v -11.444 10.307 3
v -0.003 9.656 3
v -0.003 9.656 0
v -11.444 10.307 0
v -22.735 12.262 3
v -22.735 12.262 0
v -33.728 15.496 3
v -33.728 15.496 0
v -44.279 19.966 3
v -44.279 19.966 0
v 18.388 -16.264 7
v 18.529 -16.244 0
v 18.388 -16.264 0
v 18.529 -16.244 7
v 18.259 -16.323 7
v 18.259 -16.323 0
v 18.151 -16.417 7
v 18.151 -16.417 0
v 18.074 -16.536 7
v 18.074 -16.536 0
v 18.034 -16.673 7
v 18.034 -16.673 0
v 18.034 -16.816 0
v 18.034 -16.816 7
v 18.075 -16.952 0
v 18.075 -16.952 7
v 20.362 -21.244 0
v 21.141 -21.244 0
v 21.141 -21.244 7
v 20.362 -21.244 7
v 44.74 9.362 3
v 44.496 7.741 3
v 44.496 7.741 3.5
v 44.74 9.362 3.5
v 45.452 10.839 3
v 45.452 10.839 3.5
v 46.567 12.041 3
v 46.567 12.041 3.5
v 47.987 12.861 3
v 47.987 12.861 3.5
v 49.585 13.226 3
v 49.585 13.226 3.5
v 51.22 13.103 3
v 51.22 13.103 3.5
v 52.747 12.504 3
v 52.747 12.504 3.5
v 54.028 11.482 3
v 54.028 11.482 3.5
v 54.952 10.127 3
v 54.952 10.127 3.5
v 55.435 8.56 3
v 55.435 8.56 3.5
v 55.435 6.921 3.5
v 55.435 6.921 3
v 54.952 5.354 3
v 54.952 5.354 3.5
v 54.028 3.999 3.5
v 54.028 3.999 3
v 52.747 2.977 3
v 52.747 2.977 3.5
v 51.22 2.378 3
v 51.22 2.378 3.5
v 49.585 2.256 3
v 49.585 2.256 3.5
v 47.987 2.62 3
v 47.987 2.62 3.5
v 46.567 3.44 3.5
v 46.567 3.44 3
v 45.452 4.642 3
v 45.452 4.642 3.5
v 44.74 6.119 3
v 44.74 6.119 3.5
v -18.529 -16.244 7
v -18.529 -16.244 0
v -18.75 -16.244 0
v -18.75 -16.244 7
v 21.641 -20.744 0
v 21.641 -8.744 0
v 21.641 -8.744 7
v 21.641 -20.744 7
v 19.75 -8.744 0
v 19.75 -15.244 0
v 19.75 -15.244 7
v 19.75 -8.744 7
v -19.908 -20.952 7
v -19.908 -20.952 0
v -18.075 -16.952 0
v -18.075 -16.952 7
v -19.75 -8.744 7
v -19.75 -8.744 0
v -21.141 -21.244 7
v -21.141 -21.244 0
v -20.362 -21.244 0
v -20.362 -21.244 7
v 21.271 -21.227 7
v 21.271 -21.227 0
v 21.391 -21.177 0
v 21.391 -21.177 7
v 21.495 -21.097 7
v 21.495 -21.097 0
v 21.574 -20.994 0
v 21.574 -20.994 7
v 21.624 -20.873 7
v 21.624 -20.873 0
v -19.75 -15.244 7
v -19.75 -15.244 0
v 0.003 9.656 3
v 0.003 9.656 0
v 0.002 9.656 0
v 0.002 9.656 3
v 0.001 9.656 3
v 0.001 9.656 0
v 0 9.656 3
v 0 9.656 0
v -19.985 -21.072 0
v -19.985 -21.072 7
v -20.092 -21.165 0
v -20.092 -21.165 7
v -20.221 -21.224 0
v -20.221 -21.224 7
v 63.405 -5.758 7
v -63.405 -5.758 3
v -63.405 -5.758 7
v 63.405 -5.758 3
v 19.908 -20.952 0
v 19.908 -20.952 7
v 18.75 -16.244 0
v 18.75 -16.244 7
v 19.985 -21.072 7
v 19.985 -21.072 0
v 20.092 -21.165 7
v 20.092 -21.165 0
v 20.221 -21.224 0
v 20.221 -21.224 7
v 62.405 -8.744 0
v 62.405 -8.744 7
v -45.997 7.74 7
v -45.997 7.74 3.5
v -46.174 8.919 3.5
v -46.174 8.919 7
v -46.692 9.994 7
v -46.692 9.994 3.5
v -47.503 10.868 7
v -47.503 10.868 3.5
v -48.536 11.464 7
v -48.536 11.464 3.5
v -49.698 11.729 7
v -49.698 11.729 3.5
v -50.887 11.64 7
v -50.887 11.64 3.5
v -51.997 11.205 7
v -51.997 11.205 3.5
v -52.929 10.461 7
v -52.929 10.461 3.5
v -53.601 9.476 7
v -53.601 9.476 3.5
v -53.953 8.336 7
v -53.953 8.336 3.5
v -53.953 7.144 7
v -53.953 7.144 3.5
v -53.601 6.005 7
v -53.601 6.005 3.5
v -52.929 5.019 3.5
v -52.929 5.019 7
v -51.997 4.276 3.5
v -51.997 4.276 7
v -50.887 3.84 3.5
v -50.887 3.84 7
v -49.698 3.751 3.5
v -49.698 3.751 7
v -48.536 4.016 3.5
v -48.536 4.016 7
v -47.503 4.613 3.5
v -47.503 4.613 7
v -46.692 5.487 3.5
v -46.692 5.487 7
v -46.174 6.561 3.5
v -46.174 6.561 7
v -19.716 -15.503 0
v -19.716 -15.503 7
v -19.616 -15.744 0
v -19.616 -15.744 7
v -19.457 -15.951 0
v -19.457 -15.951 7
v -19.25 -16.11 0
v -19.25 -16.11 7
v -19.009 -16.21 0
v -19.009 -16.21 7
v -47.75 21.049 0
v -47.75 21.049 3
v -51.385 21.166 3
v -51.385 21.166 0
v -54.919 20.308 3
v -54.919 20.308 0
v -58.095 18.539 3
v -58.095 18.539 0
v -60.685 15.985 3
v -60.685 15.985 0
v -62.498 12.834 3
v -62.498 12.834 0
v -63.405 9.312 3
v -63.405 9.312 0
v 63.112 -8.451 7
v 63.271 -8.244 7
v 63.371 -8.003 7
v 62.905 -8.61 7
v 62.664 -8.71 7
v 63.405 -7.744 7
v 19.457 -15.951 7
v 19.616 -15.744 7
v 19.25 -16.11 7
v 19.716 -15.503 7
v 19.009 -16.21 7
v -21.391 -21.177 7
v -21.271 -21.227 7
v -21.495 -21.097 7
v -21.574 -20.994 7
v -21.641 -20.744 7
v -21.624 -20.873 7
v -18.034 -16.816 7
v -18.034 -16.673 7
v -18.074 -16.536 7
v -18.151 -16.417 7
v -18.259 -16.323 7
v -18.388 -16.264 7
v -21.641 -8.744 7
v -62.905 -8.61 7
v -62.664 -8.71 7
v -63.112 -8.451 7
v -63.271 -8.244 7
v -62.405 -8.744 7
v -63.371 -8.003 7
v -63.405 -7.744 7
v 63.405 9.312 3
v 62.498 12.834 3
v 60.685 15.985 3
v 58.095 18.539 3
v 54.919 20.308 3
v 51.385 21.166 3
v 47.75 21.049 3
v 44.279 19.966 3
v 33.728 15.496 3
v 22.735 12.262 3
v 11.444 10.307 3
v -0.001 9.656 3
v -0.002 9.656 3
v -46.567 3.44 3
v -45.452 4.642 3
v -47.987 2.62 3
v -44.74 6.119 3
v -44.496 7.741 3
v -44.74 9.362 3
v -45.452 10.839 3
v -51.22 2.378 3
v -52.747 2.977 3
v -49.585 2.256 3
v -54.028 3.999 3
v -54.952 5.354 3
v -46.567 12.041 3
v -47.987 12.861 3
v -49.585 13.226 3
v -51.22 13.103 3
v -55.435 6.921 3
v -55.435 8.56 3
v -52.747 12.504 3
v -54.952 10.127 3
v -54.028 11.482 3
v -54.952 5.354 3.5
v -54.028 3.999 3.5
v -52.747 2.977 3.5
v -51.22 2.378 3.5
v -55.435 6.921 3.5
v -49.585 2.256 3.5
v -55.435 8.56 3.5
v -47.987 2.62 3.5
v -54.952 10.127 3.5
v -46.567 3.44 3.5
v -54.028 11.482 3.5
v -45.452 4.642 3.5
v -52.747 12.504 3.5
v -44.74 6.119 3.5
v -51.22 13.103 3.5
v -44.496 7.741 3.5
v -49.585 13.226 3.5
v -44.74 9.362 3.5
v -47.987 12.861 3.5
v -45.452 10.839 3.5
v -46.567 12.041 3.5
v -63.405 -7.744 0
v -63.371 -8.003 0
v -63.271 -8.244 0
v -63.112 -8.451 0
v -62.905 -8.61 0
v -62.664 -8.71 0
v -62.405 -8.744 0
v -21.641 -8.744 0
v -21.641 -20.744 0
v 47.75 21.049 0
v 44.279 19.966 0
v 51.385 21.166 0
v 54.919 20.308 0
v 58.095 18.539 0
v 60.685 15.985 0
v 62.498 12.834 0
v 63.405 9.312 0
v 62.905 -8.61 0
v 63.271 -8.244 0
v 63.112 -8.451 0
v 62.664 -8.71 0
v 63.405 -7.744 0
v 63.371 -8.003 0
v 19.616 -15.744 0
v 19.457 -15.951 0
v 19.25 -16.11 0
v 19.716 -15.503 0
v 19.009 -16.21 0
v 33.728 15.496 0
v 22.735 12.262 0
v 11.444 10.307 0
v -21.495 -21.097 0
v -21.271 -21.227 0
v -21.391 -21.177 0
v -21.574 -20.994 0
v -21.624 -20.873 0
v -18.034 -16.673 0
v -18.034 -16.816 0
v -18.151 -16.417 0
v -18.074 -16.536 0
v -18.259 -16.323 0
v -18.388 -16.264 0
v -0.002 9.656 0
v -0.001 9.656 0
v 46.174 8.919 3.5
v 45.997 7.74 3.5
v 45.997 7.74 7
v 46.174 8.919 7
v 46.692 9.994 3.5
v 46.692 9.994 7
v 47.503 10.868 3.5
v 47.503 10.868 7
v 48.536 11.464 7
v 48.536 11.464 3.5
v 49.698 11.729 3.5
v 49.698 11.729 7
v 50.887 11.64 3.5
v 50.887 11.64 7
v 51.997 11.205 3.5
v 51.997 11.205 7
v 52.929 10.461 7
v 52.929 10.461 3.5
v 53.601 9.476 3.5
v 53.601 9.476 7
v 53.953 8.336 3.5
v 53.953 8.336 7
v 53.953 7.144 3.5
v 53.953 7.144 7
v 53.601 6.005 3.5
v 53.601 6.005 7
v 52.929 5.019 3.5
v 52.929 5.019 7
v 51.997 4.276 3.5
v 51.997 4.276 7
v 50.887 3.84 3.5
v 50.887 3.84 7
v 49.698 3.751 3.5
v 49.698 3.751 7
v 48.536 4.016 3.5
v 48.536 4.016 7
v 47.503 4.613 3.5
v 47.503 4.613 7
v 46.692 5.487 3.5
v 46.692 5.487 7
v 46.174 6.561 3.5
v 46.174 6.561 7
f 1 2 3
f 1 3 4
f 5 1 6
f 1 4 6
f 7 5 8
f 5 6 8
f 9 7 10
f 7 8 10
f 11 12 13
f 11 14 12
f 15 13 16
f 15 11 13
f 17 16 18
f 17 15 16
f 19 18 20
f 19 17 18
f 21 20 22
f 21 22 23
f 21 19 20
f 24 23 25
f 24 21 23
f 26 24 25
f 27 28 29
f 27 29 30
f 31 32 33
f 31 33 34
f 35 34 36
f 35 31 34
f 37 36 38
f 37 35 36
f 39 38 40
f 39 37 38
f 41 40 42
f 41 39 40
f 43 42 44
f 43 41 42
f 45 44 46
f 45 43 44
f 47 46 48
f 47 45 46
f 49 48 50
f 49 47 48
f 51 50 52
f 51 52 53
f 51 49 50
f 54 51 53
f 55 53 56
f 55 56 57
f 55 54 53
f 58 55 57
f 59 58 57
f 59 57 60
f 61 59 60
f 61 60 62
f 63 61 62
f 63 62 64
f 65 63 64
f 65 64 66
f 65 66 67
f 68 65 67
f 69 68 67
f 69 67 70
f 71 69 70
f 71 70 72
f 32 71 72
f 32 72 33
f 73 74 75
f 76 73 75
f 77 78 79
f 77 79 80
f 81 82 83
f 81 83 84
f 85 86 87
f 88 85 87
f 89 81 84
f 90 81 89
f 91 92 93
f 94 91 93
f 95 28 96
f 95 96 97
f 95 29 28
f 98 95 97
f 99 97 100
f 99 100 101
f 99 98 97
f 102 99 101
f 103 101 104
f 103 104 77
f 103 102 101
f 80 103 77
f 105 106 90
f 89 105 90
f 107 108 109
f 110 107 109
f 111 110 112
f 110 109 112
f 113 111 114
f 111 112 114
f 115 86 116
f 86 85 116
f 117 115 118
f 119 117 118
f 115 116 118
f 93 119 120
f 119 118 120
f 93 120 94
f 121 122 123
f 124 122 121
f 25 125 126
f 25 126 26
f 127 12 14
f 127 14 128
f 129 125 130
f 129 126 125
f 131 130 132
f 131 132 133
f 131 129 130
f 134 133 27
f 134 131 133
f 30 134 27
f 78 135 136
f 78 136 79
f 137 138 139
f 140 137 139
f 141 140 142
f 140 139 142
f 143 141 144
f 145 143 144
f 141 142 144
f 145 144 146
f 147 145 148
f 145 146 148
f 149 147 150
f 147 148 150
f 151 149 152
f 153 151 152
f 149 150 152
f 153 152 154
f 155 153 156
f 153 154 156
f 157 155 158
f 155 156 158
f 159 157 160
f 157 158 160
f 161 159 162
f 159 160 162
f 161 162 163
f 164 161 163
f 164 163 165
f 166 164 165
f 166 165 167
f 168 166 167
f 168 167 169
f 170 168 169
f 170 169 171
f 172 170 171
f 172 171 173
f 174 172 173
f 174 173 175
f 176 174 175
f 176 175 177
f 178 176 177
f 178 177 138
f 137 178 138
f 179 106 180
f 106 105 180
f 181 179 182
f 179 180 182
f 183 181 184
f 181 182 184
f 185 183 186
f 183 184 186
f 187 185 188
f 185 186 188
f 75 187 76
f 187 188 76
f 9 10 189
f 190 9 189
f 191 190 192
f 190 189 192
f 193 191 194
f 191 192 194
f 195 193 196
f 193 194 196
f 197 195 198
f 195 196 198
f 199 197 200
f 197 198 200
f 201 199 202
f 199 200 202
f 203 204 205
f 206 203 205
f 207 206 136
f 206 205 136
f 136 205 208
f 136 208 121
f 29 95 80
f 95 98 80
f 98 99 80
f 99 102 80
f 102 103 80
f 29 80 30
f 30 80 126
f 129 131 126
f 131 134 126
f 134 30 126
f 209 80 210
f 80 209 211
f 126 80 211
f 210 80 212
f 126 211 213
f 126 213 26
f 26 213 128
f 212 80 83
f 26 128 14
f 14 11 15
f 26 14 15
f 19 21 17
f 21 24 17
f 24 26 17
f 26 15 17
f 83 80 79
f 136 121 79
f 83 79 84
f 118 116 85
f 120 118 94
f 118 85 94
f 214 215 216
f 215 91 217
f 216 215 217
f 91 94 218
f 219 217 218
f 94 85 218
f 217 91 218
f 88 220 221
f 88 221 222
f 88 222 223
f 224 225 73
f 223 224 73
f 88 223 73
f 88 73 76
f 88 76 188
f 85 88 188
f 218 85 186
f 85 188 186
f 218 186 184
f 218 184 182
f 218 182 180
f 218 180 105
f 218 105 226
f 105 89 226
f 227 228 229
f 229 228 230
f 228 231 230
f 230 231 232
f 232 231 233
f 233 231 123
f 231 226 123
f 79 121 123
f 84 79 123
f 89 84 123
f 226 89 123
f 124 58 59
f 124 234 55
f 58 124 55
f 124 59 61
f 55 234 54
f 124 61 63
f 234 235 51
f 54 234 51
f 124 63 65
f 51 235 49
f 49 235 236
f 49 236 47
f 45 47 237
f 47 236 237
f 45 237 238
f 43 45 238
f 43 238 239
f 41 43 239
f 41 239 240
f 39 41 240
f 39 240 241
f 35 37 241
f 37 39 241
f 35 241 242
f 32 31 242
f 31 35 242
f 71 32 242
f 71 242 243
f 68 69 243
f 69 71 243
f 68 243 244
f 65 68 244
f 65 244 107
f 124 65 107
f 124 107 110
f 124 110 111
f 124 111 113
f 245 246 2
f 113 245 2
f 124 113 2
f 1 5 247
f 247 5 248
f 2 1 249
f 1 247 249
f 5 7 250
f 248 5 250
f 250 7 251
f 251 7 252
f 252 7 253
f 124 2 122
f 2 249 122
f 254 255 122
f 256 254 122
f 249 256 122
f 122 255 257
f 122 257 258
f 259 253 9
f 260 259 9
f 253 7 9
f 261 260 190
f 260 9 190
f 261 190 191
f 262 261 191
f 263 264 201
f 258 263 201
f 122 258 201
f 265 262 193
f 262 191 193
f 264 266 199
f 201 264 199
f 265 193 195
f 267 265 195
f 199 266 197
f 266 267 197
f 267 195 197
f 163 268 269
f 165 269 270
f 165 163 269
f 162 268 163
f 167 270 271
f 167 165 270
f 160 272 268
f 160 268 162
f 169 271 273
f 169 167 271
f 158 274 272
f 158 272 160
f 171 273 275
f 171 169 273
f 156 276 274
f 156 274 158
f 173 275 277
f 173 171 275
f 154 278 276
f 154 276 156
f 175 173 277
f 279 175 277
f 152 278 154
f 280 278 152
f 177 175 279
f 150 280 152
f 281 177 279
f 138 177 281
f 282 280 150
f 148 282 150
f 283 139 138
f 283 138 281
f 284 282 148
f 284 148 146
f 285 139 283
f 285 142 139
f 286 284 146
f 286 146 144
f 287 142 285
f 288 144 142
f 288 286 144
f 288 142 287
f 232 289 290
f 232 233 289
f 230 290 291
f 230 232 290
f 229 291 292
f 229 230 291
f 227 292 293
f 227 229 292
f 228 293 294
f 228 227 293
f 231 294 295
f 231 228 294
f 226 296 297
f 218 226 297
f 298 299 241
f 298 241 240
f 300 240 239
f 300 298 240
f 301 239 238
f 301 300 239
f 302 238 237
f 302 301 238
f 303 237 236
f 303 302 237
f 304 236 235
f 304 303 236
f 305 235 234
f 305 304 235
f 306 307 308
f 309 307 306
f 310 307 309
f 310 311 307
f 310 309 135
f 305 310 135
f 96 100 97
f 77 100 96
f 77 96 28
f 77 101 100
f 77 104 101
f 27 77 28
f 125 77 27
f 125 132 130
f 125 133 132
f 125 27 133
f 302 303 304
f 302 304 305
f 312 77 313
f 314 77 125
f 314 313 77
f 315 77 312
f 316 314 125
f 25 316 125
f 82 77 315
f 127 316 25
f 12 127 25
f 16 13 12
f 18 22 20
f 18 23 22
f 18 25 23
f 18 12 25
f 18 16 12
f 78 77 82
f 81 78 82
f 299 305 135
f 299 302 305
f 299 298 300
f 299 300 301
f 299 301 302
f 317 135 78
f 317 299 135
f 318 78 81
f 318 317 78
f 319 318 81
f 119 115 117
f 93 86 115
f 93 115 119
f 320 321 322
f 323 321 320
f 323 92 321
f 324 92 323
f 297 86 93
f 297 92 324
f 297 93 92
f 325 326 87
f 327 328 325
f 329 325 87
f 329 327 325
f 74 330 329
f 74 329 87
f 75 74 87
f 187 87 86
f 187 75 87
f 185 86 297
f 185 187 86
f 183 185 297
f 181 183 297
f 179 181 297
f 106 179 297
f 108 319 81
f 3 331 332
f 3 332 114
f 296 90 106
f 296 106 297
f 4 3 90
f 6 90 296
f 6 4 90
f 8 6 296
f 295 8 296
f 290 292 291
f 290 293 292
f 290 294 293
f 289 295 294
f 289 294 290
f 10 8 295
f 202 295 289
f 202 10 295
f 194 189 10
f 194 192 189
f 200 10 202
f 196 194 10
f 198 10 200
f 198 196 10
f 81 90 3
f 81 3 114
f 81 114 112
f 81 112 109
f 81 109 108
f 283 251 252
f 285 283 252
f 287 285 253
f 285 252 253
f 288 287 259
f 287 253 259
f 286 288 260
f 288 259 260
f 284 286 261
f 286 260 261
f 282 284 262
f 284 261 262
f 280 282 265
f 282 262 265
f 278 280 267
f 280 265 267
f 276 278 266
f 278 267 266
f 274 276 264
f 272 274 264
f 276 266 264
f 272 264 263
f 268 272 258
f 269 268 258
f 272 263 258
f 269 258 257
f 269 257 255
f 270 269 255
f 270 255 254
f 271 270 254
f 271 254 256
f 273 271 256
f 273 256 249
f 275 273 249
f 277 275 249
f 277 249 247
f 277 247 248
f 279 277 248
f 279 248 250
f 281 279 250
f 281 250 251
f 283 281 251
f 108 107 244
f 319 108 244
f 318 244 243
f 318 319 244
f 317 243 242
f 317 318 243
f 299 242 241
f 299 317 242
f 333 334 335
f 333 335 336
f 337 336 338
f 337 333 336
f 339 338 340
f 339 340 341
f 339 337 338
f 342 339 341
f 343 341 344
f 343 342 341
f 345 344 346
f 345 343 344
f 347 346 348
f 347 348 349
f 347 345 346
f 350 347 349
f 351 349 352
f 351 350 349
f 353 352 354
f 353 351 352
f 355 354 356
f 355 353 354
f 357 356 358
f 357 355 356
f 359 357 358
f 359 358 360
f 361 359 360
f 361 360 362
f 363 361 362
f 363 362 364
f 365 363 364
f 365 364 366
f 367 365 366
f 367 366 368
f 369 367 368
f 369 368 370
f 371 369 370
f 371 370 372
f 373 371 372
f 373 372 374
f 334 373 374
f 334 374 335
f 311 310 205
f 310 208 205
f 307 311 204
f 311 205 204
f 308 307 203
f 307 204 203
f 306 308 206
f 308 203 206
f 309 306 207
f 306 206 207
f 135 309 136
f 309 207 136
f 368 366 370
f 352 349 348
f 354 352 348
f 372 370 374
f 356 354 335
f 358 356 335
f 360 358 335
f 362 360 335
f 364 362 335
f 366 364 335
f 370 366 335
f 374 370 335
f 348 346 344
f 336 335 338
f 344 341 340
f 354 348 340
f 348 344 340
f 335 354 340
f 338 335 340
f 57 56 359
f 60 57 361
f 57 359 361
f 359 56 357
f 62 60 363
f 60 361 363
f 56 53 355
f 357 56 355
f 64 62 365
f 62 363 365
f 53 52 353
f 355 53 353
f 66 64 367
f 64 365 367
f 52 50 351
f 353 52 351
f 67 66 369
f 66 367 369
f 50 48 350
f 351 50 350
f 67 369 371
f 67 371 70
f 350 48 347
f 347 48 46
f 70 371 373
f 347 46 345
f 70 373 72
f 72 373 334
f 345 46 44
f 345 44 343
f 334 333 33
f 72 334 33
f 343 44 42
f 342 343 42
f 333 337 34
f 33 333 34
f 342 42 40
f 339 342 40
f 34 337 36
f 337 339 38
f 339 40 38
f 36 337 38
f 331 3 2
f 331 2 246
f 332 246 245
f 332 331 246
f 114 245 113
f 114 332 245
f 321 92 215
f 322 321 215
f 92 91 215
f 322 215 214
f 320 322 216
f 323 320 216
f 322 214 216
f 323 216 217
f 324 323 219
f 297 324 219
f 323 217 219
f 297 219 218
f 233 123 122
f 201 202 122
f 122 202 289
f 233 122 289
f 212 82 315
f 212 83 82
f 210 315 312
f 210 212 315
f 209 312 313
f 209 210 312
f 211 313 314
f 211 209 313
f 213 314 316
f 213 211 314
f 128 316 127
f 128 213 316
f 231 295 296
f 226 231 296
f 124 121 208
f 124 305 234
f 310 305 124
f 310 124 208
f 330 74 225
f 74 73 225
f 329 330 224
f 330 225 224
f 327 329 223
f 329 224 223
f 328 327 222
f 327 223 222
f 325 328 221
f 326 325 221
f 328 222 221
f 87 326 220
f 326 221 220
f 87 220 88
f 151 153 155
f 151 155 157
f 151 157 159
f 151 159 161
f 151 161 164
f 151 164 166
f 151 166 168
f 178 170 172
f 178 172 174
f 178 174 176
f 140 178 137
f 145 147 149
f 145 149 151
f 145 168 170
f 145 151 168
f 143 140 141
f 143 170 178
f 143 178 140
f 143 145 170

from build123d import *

# Parameters (mm, degrees)
F0_R     = 5.500353
F1_DEPTH = 3
F0_R_2   = 4.000323
F2_DEPTH = 3.5
F3_DEPTH = 7
F4_R     = 1
F5_R     = 0.5


with BuildPart() as f1:
    # F0 (on Top) → F1 (new body)
    with BuildSketch(Plane.XY):
        with BuildLine():
            ThreePointArc((0.003197, 9.6562), (-22.731522, 12.261138), (-44.2788, 19.966198))
            ThreePointArc((-44.2788, 19.966198), (-56.566858, 19.530956), (-63.405201, 9.312206))
            Line((-63.405201, 9.312206), (-63.405201, -5.757801))
            Line((-63.405201, -5.757801), (0.000519, -5.757801))
            Line((0.000519, -5.757801), (0.003197, 9.6562))
        make_face()
        with Locations((-49.99641, 7.740587)):
            Circle(F0_R, mode=Mode.SUBTRACT)
    extrude(amount=F1_DEPTH)

    # F0 (on Top) → F2 (join)
    with BuildSketch(Plane.XY):
        with Locations((-49.99641, 7.740587)):
            Circle(F0_R)
        with Locations((-49.997022, 7.740204)):
            Circle(F0_R_2, mode=Mode.SUBTRACT)
    extrude(amount=F2_DEPTH)

    # F0 (on Top) → F3 (join)
    with BuildSketch(Plane.XY):
        Polygon((-19.75, -8.743801), (-21.641288, -8.743801), (-21.641288, -21.243801), (-20.041288, -21.243801), (-17.75, -16.243801), (-19.75, -16.243801), align=None)
        with Locations((-49.997022, 7.740204)):
            Circle(F0_R_2)
        Polygon((0.000519, -5.757801), (-63.405201, -5.757801), (-63.405201, -8.743801), (-21.641288, -8.743801), (-19.75, -8.743801), (0, -8.743801), align=None)
    extrude(amount=F3_DEPTH)

    # F4
    f4_edges = [f1.edges().sort_by_distance(p)[0] for p in [
        (-19.75, -16.243801, 3.5),
        (-63.405201, -8.743801, 3.5),
    ]]
    fillet(f4_edges, radius=F4_R)

    # F5
    f5_edges = [f1.edges().sort_by_distance(p)[0] for p in [
        (-17.75, -16.243801, 3.5),
        (-20.041288, -21.243801, 3.5),
        (-21.641288, -21.243801, 3.5),
    ]]
    fillet(f5_edges, radius=F5_R)

    # F6: F1 across plane


with BuildPart() as f1_1:
    add(f1.part)
    add(f1.part.mirror(Plane.YZ))


solid = f1_1.part
